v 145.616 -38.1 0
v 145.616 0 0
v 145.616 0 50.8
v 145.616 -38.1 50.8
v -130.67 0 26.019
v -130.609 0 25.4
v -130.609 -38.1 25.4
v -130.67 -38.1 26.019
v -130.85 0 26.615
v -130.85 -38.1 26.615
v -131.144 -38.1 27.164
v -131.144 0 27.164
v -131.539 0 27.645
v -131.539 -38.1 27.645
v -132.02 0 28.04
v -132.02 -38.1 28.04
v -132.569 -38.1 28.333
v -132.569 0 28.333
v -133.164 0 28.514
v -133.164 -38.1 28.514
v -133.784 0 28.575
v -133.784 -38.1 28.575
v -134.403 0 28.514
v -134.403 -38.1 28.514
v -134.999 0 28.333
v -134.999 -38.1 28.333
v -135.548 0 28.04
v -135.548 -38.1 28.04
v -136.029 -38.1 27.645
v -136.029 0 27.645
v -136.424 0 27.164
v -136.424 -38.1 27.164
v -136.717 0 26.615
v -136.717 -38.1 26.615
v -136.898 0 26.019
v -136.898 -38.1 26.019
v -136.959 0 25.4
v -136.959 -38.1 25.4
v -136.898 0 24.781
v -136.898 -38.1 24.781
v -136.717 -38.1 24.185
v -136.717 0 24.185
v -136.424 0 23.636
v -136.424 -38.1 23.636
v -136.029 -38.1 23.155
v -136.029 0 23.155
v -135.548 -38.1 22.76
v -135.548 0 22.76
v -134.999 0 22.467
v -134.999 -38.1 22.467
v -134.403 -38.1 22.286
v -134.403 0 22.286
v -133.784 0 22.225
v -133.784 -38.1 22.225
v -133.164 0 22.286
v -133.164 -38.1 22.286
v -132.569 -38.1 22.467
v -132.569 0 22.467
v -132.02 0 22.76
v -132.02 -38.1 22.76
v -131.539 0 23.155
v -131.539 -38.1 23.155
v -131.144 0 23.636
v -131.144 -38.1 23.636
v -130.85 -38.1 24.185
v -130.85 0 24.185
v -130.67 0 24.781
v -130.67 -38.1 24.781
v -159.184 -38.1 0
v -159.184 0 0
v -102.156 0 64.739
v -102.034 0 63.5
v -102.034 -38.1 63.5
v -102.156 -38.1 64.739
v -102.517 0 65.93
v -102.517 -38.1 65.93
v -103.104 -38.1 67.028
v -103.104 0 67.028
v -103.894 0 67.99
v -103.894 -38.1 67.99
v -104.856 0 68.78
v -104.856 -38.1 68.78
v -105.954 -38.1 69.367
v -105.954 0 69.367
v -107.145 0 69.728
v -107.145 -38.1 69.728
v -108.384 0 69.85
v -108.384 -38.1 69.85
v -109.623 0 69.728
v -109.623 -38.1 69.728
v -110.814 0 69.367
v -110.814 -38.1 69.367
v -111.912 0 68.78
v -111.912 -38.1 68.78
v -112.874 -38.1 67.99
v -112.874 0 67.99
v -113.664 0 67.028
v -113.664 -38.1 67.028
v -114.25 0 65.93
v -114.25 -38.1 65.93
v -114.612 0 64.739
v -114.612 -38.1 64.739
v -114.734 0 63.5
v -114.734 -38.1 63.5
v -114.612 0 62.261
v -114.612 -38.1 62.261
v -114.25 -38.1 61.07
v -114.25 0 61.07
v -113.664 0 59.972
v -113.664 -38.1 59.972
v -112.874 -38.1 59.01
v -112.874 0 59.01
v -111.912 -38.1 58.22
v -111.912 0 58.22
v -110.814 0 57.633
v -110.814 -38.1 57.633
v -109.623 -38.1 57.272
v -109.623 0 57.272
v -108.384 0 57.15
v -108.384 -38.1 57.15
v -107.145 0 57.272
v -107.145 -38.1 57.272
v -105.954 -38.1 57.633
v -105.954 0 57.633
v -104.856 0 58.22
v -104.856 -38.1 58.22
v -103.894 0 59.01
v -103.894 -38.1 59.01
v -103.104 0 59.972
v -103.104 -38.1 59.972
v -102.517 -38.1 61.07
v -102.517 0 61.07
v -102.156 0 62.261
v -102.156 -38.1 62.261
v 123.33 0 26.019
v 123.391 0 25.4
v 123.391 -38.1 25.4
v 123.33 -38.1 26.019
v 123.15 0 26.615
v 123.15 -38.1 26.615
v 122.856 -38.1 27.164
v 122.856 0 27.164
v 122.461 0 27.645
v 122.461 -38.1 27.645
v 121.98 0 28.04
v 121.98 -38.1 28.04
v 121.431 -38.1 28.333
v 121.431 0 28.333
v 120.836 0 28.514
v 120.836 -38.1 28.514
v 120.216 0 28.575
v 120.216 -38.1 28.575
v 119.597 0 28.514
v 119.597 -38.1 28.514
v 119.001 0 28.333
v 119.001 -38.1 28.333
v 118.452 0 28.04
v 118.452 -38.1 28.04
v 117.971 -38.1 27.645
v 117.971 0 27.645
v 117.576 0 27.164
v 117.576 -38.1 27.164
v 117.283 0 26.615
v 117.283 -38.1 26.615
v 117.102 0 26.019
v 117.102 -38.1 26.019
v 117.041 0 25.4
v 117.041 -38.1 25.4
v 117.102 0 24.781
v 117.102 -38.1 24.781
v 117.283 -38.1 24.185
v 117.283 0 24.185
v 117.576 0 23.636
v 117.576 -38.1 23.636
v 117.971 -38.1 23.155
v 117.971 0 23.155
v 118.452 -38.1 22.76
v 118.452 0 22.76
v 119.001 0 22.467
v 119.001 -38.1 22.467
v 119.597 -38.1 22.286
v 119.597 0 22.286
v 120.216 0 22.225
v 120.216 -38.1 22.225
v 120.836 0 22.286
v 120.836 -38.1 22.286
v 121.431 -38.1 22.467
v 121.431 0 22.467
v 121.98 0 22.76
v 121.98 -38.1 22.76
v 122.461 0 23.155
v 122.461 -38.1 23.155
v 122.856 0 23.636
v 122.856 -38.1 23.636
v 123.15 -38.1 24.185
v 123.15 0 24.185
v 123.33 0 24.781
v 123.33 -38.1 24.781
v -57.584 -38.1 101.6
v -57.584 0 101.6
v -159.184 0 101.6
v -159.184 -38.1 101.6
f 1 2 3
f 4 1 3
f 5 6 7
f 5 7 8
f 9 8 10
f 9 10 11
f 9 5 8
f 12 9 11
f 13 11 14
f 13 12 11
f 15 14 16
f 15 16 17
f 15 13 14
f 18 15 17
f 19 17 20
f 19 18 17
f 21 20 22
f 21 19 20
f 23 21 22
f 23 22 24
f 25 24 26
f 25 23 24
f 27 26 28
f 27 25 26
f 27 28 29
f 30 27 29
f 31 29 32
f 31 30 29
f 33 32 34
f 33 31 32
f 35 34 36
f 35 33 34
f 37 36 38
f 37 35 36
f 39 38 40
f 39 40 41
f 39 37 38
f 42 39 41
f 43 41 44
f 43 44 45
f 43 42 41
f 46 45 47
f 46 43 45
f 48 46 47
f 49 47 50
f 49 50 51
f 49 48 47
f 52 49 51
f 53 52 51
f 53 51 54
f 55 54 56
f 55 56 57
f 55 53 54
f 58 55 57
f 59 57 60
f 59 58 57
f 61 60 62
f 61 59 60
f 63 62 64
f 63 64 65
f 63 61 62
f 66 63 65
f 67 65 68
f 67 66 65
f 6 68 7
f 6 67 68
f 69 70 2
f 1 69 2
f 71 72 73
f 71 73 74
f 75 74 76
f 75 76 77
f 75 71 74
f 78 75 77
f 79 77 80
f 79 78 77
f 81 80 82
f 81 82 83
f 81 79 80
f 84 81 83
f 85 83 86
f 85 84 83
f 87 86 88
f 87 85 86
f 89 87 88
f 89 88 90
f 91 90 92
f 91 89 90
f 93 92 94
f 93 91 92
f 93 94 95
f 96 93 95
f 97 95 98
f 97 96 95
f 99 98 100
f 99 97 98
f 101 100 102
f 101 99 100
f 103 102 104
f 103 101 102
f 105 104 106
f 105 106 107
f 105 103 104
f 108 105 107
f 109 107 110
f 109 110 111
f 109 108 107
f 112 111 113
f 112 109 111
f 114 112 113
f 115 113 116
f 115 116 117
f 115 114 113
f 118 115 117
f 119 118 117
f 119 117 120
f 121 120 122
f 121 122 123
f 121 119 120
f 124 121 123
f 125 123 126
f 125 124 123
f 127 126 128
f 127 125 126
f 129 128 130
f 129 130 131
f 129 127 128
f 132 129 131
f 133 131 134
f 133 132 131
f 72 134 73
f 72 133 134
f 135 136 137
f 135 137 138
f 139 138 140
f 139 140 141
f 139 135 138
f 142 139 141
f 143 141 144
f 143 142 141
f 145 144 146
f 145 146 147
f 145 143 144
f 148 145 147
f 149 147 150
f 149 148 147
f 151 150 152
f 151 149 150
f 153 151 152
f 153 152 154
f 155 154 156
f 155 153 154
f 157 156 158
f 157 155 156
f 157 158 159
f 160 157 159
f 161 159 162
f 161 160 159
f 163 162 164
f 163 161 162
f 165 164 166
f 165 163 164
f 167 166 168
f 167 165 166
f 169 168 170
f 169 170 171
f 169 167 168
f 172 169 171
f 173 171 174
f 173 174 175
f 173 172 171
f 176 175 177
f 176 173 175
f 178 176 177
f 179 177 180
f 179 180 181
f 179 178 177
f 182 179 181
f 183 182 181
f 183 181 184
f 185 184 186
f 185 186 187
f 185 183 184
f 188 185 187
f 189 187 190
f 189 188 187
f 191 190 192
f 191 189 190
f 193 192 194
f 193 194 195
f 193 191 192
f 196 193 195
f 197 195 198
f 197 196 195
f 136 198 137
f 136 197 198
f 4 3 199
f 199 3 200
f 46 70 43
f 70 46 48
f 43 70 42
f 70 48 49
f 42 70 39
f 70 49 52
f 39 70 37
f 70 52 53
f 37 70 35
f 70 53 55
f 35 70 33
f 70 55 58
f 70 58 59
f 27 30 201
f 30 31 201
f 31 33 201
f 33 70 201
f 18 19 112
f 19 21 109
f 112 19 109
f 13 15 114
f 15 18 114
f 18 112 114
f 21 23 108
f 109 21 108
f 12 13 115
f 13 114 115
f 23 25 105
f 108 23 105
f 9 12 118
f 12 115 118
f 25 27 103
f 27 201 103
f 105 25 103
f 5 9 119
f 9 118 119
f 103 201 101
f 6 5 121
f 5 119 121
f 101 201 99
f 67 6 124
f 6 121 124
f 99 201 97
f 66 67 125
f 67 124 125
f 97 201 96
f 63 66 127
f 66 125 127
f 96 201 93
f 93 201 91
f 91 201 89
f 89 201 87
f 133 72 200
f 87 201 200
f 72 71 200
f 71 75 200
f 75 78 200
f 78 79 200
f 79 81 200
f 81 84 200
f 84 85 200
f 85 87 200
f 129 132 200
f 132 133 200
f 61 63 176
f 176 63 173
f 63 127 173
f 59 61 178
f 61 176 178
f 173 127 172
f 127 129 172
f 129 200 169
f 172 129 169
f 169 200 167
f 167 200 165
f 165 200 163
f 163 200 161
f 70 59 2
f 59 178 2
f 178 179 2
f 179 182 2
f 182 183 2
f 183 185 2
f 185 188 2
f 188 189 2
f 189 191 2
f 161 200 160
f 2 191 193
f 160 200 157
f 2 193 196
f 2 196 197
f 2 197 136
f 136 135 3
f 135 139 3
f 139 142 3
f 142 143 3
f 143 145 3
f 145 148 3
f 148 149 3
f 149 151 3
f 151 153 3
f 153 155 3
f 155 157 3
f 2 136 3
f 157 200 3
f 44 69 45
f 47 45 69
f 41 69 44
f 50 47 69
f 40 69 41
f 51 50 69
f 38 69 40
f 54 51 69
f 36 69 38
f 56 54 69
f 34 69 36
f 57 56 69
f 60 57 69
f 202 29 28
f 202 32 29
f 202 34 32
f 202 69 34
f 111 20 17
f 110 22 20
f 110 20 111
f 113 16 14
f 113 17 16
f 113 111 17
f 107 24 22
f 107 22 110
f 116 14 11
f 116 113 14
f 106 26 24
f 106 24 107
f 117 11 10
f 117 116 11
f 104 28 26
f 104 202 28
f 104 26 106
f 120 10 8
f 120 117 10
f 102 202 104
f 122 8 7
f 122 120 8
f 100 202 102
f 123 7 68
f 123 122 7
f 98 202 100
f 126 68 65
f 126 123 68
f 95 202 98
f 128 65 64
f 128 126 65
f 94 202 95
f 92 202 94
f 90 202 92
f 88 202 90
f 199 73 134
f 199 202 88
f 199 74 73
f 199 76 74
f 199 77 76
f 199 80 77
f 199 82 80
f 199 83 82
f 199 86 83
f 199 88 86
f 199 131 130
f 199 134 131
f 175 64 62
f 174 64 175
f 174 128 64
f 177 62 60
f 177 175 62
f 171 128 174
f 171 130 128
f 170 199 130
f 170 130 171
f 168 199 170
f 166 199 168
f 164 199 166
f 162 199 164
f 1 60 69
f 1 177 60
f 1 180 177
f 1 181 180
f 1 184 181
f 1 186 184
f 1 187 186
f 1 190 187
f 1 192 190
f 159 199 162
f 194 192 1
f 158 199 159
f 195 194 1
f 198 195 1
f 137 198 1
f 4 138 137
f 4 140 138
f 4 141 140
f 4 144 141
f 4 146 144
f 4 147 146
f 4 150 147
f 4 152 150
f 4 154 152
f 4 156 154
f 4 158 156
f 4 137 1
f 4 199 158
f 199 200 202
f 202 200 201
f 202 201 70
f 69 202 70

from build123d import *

# Parameters (mm, degrees)
F0_R     = 3.175
F0_R_2   = 6.35
F1_DEPTH = 38.1


with BuildPart() as f1:
    # F0 (on Front) → F1 (new body)
    with BuildSketch(Plane.XZ):
        Polygon((-57.583724, 101.6), (-159.183724, 101.6), (-159.183724, 0), (145.616276, 0), (145.616276, 50.8), align=None)
        with Locations((-133.783724, 25.4)):
            Circle(F0_R, mode=Mode.SUBTRACT)
        with Locations((120.216276, 25.4)):
            Circle(F0_R, mode=Mode.SUBTRACT)
        with Locations((-108.383724, 63.5)):
            Circle(F0_R_2, mode=Mode.SUBTRACT)
    extrude(amount=F1_DEPTH)


solid = f1.part
